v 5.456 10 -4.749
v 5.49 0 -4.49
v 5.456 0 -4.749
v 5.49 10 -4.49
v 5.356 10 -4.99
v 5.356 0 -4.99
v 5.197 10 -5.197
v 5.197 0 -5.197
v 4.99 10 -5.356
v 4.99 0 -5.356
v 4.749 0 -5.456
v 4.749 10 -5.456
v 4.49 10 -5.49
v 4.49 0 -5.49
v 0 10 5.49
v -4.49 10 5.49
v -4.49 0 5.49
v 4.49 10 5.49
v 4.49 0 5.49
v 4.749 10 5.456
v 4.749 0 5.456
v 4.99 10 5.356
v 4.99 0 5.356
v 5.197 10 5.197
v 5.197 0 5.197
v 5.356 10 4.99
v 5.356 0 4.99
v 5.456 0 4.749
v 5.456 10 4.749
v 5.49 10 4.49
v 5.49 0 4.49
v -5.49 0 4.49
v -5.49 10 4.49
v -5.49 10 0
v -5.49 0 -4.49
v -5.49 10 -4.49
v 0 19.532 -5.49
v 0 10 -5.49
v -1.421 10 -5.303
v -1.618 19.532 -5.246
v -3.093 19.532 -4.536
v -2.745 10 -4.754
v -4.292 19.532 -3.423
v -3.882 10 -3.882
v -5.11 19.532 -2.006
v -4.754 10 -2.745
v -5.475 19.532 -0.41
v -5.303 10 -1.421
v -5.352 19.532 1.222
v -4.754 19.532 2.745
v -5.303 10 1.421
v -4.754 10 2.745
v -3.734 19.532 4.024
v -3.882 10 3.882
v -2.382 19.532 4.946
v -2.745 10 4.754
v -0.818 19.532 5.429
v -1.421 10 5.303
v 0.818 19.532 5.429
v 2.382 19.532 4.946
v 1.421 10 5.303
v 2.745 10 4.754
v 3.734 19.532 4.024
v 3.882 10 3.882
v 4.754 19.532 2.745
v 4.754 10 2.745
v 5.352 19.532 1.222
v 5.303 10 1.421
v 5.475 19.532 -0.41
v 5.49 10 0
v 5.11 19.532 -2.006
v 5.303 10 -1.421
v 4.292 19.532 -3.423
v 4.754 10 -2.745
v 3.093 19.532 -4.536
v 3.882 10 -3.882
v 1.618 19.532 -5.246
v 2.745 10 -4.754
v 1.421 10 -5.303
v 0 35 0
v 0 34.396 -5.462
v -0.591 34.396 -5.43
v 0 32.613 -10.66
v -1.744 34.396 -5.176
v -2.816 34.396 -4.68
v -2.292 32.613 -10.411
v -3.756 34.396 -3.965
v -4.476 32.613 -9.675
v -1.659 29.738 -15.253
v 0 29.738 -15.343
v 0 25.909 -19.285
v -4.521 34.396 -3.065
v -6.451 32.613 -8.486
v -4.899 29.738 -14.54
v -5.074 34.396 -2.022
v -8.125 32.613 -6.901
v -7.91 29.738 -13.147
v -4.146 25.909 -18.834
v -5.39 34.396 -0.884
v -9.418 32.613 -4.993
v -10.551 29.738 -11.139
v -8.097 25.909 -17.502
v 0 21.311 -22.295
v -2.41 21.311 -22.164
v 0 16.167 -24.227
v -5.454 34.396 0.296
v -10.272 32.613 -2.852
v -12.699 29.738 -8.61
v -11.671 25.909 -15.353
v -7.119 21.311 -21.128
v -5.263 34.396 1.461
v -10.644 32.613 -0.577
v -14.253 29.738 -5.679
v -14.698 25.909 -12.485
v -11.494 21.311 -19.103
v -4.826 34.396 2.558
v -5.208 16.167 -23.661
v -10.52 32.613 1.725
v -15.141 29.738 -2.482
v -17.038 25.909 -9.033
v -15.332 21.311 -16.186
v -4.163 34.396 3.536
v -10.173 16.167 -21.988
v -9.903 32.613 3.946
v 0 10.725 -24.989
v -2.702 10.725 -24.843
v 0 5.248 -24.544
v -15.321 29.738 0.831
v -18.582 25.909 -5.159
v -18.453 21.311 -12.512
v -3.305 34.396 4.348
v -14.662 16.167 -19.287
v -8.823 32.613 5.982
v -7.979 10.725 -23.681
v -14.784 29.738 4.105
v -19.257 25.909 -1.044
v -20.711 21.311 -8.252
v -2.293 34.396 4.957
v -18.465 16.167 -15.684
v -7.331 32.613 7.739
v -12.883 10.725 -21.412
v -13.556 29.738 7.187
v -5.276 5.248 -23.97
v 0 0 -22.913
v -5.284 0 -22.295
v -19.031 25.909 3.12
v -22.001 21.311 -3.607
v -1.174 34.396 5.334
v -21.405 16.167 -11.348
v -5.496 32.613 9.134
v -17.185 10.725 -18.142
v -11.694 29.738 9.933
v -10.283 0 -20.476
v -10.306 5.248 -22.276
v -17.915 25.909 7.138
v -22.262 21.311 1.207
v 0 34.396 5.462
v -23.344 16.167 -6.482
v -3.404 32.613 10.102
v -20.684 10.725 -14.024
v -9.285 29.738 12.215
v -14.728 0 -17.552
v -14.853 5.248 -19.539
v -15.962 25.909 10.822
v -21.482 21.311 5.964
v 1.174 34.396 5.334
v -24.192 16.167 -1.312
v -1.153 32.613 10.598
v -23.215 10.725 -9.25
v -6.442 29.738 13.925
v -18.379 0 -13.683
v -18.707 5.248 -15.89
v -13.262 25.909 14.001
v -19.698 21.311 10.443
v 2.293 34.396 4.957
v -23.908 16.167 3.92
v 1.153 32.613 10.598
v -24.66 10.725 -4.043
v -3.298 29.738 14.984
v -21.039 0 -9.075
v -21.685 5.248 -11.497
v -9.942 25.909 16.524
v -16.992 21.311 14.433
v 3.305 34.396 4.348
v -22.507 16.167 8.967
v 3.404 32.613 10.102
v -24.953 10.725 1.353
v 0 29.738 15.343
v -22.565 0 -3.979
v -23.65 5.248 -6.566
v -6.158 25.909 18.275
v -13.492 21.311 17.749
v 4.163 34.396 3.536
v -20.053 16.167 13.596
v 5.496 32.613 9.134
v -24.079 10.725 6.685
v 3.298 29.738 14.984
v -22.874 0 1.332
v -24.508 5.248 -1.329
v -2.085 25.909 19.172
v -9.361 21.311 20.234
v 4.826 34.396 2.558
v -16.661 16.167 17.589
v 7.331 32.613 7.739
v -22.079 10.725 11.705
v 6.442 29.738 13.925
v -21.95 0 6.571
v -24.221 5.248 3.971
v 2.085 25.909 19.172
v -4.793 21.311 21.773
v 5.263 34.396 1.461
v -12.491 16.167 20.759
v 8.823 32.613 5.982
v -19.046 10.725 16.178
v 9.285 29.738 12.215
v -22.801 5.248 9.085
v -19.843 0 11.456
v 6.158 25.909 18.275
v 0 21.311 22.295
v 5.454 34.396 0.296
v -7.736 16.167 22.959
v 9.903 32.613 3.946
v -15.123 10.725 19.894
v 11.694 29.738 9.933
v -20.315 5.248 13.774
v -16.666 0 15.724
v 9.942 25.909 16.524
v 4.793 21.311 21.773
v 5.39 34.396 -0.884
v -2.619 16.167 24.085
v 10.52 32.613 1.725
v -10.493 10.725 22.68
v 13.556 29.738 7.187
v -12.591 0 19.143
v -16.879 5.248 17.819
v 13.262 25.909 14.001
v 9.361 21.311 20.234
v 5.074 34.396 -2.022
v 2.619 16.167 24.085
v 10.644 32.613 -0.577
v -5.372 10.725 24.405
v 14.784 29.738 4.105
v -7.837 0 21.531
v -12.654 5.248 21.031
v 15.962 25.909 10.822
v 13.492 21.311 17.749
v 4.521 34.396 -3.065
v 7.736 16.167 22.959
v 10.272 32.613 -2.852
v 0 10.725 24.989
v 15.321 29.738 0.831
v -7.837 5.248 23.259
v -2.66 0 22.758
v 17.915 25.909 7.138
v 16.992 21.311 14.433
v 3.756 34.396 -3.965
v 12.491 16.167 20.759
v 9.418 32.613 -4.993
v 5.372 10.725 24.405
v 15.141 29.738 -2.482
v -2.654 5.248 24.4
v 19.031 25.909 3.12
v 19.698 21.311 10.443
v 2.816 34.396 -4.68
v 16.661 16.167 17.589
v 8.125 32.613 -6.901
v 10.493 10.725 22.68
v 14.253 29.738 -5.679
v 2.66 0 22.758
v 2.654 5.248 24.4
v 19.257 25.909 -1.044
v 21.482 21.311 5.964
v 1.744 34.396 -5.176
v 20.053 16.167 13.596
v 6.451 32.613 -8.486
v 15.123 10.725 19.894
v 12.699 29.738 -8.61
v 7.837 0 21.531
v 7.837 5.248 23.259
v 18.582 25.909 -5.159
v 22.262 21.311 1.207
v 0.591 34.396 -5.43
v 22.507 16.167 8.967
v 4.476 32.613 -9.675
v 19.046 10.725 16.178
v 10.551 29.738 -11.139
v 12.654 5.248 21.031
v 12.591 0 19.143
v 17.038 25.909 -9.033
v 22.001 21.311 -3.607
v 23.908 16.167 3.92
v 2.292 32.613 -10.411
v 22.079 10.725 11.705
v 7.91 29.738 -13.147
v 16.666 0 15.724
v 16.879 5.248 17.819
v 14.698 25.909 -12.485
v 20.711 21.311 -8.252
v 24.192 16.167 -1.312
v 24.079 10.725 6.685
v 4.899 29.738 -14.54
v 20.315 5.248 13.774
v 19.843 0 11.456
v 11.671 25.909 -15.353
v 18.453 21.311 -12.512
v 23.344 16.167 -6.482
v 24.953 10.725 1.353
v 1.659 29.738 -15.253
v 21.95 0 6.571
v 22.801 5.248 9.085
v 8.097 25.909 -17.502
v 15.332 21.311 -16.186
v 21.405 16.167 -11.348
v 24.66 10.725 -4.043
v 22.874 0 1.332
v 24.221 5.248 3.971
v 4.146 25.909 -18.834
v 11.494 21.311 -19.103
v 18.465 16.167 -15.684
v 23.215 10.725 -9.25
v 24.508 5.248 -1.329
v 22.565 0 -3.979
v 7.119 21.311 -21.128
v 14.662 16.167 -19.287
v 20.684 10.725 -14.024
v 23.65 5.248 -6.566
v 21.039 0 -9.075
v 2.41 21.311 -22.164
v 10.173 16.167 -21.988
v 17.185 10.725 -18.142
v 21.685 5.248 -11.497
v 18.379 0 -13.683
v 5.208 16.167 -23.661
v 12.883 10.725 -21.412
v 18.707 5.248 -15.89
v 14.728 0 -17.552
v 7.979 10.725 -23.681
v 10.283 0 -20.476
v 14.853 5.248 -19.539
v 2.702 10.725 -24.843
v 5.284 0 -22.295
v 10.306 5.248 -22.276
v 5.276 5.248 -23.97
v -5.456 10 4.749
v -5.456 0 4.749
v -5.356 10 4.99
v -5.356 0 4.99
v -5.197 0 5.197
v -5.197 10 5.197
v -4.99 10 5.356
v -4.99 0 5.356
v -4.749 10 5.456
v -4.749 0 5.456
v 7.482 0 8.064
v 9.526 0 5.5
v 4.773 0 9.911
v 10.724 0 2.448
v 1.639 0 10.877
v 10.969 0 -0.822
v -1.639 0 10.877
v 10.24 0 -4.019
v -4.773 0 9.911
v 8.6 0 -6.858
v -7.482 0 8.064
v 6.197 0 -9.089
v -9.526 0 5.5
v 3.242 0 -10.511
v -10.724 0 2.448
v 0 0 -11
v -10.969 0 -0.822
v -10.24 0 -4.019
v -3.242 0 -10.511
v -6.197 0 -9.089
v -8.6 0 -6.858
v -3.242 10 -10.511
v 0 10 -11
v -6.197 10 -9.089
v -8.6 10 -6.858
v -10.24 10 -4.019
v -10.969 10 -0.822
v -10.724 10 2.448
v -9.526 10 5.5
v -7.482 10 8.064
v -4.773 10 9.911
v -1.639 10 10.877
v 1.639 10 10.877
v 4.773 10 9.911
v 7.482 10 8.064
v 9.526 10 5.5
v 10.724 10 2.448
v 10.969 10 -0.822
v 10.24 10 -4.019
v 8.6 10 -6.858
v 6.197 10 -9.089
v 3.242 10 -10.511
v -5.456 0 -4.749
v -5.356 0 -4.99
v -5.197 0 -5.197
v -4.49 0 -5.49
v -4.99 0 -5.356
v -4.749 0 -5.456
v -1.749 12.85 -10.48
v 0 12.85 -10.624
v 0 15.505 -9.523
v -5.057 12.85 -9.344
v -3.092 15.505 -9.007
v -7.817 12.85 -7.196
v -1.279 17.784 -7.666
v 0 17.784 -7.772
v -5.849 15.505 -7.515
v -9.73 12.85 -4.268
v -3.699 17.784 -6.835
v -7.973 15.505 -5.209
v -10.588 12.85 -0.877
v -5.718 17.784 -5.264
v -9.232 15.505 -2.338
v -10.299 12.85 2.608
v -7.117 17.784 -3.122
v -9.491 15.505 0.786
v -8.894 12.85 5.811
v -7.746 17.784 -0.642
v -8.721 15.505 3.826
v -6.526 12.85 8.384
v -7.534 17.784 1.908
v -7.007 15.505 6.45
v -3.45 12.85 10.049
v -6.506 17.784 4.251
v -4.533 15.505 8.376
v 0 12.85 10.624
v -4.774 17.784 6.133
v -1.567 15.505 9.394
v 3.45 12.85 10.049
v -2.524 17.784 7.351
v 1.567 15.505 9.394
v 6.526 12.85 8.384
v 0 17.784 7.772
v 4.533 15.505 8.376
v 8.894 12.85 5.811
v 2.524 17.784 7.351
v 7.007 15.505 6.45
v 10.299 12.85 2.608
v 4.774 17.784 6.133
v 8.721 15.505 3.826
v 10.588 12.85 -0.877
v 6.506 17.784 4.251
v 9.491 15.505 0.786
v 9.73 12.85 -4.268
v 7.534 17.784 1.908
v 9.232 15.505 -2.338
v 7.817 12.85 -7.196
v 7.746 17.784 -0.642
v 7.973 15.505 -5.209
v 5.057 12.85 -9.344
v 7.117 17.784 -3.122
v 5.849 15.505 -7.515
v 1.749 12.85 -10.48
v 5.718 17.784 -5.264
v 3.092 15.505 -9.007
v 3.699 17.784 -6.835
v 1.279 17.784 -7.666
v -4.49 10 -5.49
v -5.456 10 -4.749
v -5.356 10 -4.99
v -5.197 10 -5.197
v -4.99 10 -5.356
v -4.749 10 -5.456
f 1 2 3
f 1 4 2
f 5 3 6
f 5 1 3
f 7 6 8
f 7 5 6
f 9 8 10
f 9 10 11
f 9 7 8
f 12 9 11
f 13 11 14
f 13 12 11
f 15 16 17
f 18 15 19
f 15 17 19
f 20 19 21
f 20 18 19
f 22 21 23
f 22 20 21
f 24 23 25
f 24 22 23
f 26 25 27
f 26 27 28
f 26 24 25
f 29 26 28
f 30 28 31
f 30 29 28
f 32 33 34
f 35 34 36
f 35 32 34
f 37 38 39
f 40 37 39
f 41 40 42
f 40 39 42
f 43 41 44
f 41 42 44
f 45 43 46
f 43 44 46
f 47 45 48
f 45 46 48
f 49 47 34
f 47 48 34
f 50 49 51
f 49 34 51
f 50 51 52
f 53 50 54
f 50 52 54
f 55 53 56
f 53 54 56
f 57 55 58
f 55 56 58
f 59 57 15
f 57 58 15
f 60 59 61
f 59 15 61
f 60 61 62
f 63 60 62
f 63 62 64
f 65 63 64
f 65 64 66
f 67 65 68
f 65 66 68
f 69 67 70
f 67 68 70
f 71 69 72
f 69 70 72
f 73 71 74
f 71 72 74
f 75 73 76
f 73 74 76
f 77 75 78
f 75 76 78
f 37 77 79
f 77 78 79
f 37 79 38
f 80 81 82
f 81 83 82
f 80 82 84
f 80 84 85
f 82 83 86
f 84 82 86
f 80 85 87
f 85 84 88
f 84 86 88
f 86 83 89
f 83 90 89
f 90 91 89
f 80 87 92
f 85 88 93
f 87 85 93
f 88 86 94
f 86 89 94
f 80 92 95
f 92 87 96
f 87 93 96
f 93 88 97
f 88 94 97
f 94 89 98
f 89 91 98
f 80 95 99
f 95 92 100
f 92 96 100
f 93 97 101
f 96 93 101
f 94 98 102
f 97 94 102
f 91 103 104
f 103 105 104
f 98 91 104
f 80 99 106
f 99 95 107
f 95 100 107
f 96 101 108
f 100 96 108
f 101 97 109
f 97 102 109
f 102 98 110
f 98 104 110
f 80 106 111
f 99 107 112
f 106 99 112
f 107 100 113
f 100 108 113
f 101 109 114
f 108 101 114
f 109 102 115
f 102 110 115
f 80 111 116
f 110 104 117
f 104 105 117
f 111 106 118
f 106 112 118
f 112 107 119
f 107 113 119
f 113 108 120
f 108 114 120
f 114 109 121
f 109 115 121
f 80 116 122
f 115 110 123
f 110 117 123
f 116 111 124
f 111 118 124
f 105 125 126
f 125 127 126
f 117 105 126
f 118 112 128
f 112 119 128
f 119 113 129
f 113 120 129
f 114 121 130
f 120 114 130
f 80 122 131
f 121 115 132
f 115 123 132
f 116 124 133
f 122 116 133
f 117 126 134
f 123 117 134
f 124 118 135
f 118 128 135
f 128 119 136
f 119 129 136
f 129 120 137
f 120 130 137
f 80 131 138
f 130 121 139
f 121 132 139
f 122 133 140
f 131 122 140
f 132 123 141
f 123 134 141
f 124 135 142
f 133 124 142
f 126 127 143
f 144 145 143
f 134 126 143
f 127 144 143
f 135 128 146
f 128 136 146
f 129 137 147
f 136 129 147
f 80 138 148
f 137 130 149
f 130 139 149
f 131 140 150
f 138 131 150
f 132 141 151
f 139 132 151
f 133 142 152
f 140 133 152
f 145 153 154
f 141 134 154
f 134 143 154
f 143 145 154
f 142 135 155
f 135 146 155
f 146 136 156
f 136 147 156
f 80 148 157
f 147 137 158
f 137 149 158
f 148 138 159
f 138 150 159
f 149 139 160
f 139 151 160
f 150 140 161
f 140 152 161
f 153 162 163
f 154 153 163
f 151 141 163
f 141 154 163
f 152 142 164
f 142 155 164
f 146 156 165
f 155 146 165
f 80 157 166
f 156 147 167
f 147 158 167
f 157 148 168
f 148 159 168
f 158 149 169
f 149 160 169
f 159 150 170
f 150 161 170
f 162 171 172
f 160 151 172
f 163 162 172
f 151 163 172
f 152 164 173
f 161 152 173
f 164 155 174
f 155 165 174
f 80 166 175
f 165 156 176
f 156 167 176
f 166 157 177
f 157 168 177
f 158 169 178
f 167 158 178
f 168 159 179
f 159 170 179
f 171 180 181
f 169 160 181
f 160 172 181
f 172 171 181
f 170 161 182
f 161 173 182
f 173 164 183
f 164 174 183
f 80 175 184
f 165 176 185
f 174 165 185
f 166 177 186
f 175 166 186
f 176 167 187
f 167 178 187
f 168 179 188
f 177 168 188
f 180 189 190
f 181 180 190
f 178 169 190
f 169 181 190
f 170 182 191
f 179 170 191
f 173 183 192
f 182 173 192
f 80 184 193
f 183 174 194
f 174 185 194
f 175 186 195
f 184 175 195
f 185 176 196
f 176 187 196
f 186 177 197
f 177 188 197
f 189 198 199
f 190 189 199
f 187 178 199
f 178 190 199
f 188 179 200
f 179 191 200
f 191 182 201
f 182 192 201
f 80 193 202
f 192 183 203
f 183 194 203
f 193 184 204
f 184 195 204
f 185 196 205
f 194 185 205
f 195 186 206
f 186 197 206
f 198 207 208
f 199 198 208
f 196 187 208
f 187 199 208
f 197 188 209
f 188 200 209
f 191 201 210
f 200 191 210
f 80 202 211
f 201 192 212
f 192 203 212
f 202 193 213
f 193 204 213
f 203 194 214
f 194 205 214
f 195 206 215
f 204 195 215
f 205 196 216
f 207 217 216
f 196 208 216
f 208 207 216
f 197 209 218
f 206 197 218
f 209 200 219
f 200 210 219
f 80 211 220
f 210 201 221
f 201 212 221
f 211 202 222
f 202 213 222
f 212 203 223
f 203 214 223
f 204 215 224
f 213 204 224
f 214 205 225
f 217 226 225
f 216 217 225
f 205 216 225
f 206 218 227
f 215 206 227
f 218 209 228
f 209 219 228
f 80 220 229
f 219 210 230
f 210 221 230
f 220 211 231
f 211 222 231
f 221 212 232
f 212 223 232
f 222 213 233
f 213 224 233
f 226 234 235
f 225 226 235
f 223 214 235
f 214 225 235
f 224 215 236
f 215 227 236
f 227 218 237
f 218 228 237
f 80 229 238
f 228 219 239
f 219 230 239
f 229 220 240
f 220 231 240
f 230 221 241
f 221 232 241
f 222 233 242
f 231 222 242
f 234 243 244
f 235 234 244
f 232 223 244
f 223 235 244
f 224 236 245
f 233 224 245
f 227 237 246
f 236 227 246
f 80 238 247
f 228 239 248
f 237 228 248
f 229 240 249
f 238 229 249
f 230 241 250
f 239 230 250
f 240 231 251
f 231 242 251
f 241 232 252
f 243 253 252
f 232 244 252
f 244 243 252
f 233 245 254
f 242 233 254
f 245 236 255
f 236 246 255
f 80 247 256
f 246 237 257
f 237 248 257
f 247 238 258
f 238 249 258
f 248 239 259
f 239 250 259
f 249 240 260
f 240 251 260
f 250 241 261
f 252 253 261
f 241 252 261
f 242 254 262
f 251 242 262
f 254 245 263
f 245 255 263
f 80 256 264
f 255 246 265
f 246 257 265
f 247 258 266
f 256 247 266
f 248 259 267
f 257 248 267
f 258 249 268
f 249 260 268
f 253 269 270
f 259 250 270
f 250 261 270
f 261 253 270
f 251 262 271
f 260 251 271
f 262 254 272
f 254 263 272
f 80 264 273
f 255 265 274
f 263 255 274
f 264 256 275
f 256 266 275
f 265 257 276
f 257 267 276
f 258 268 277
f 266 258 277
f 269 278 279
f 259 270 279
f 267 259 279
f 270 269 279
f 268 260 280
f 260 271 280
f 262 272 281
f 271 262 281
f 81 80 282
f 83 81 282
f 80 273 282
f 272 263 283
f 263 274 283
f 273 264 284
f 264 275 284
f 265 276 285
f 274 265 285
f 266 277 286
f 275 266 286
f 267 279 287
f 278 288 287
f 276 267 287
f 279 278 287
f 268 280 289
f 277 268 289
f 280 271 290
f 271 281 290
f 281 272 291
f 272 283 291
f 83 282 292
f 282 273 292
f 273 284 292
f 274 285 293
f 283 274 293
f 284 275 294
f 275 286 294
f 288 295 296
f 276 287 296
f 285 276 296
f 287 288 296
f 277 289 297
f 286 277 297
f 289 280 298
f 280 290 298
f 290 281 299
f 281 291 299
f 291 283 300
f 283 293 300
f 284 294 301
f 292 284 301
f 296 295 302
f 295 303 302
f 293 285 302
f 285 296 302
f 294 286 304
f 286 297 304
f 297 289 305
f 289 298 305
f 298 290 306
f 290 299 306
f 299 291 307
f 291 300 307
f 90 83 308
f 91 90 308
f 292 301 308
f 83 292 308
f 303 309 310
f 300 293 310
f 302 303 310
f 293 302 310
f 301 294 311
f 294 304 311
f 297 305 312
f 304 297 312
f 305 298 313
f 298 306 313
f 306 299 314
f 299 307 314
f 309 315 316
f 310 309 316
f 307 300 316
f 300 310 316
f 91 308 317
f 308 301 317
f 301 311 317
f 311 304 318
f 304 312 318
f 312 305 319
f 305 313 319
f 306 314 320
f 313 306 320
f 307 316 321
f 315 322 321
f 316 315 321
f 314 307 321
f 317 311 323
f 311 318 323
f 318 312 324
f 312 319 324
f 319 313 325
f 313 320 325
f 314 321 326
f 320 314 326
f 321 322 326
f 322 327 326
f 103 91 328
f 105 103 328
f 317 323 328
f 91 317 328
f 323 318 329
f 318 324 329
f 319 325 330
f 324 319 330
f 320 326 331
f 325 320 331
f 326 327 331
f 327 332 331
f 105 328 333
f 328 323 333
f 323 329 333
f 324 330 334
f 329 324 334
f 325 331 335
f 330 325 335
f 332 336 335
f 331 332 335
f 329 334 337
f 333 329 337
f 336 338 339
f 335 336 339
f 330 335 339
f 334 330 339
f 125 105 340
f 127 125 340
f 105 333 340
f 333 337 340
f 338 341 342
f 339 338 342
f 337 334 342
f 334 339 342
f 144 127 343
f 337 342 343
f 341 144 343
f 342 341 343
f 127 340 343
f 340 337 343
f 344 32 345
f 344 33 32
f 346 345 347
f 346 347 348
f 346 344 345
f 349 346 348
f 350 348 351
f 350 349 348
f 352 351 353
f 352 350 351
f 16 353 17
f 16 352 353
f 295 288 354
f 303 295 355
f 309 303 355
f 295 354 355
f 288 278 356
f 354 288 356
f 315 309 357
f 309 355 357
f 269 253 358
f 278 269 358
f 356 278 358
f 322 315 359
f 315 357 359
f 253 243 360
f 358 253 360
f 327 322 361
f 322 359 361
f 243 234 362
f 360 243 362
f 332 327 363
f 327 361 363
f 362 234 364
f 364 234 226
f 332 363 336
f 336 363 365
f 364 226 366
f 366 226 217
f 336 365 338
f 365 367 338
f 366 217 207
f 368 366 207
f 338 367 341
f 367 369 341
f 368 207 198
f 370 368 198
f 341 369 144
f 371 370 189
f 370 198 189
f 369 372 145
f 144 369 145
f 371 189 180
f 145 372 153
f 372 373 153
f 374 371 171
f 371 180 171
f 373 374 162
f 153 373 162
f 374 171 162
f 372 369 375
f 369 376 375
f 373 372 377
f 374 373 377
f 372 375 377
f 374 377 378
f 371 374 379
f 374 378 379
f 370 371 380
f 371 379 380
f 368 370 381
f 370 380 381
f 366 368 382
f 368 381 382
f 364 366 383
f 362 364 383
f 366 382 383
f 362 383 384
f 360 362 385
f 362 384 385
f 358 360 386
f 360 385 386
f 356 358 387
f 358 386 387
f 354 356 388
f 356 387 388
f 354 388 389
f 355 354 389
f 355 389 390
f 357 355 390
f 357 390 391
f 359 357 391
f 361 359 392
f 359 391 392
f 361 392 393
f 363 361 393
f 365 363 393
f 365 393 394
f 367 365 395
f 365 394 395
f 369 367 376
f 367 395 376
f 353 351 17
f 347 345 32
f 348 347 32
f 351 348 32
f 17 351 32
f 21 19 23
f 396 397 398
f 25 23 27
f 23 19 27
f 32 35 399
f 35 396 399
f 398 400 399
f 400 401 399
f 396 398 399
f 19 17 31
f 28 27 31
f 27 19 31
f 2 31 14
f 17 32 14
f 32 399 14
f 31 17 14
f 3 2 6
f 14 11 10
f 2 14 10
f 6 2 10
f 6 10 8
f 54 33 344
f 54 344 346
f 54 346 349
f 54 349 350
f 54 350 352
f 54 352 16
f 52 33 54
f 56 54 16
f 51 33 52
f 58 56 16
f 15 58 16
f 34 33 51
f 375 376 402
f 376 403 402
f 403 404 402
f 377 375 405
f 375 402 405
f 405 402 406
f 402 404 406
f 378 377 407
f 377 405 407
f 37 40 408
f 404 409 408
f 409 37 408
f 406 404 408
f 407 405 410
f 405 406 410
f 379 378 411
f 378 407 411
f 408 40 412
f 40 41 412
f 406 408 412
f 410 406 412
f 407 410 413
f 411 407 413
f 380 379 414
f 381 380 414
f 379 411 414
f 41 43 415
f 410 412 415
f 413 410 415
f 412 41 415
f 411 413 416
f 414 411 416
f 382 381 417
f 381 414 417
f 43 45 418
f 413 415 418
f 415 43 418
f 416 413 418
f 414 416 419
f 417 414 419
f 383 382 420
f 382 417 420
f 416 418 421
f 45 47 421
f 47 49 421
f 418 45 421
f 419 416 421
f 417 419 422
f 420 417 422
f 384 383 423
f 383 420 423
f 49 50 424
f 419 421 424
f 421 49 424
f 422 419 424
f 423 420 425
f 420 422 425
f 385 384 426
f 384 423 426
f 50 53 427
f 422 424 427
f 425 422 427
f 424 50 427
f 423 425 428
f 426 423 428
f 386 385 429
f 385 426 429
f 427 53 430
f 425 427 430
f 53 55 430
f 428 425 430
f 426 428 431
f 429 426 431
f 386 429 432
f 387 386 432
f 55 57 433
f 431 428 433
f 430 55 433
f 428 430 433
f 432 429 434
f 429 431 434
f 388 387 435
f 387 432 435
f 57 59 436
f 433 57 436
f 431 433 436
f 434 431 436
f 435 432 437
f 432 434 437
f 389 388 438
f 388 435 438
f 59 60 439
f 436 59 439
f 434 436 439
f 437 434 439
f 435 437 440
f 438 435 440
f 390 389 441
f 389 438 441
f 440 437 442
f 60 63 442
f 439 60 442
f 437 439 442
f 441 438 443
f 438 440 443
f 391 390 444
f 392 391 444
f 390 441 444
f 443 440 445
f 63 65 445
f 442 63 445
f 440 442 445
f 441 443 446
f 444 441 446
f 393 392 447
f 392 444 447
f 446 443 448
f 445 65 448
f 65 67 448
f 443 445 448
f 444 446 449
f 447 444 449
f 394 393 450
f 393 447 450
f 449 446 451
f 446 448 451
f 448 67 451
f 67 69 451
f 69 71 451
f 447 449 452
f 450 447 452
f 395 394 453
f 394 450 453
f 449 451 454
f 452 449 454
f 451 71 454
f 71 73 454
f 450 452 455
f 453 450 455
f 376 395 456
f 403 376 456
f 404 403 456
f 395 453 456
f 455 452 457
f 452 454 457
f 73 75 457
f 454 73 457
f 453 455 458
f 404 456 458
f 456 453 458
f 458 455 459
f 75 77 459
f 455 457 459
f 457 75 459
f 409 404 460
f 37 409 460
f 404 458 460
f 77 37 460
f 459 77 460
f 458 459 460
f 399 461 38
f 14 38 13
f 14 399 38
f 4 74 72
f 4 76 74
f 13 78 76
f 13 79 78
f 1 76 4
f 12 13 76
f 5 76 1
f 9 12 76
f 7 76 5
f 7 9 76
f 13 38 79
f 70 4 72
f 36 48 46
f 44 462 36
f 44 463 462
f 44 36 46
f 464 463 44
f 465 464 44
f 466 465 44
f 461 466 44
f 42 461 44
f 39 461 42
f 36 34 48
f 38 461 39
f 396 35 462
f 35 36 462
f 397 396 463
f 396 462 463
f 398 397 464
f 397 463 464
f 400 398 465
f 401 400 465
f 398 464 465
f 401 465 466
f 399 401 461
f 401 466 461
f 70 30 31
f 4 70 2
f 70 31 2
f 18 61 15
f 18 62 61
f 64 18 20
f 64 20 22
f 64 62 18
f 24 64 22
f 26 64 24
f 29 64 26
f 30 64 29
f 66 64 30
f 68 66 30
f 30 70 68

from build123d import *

# Parameters (mm, degrees)
SKETCH2_W           = 10.98
SKETCH2_H           = 10.98
BOSS_EXTRUDE1_DEPTH = 10
FILLET1_R           = 1


with BuildPart() as part:
    # Sketch2 → Boss-Extrude1 (new body)
    with BuildSketch(Plane(origin=(0, 0, 0), x_dir=(1, 0, 0), z_dir=(0, 1, 0))):
        Rectangle(SKETCH2_W, SKETCH2_H)
    extrude(amount=BOSS_EXTRUDE1_DEPTH)

    # Fillet1
    fillet1_edges = [part.edges().sort_by_distance(p)[0] for p in [
        (5.49, 5, 5.49),
        (-5.49, 5, 5.49),
        (-5.49, 5, -5.49),
        (5.49, 5, -5.49),
    ]]
    fillet(fillet1_edges, radius=FILLET1_R)

    # Sketch4 → Revolve1 (revolve)
    with BuildSketch(Plane(origin=(0, 0, 0), x_dir=(0, 0, -1), z_dir=(1, 0, 0))):
        with BuildLine():
            Line((22.912878475, 0), (11, 0))
            Line((11, 0), (11, 10))
            ThreePointArc((11, 10), (9.523392253, 15.504997729), (5.49, 19.53204595))
            Line((5.49, 19.53204595), (5.49, 10))
            Line((5.49, 10), (0, 10))
            Line((0, 10), (0, 35))
            ThreePointArc((0, 35), (20.916500663, 23.693063938), (22.912878475, 0))
        make_face()
    revolve(axis=Axis((0, 10, 0), (0, 1, 0)))


solid = part.part
